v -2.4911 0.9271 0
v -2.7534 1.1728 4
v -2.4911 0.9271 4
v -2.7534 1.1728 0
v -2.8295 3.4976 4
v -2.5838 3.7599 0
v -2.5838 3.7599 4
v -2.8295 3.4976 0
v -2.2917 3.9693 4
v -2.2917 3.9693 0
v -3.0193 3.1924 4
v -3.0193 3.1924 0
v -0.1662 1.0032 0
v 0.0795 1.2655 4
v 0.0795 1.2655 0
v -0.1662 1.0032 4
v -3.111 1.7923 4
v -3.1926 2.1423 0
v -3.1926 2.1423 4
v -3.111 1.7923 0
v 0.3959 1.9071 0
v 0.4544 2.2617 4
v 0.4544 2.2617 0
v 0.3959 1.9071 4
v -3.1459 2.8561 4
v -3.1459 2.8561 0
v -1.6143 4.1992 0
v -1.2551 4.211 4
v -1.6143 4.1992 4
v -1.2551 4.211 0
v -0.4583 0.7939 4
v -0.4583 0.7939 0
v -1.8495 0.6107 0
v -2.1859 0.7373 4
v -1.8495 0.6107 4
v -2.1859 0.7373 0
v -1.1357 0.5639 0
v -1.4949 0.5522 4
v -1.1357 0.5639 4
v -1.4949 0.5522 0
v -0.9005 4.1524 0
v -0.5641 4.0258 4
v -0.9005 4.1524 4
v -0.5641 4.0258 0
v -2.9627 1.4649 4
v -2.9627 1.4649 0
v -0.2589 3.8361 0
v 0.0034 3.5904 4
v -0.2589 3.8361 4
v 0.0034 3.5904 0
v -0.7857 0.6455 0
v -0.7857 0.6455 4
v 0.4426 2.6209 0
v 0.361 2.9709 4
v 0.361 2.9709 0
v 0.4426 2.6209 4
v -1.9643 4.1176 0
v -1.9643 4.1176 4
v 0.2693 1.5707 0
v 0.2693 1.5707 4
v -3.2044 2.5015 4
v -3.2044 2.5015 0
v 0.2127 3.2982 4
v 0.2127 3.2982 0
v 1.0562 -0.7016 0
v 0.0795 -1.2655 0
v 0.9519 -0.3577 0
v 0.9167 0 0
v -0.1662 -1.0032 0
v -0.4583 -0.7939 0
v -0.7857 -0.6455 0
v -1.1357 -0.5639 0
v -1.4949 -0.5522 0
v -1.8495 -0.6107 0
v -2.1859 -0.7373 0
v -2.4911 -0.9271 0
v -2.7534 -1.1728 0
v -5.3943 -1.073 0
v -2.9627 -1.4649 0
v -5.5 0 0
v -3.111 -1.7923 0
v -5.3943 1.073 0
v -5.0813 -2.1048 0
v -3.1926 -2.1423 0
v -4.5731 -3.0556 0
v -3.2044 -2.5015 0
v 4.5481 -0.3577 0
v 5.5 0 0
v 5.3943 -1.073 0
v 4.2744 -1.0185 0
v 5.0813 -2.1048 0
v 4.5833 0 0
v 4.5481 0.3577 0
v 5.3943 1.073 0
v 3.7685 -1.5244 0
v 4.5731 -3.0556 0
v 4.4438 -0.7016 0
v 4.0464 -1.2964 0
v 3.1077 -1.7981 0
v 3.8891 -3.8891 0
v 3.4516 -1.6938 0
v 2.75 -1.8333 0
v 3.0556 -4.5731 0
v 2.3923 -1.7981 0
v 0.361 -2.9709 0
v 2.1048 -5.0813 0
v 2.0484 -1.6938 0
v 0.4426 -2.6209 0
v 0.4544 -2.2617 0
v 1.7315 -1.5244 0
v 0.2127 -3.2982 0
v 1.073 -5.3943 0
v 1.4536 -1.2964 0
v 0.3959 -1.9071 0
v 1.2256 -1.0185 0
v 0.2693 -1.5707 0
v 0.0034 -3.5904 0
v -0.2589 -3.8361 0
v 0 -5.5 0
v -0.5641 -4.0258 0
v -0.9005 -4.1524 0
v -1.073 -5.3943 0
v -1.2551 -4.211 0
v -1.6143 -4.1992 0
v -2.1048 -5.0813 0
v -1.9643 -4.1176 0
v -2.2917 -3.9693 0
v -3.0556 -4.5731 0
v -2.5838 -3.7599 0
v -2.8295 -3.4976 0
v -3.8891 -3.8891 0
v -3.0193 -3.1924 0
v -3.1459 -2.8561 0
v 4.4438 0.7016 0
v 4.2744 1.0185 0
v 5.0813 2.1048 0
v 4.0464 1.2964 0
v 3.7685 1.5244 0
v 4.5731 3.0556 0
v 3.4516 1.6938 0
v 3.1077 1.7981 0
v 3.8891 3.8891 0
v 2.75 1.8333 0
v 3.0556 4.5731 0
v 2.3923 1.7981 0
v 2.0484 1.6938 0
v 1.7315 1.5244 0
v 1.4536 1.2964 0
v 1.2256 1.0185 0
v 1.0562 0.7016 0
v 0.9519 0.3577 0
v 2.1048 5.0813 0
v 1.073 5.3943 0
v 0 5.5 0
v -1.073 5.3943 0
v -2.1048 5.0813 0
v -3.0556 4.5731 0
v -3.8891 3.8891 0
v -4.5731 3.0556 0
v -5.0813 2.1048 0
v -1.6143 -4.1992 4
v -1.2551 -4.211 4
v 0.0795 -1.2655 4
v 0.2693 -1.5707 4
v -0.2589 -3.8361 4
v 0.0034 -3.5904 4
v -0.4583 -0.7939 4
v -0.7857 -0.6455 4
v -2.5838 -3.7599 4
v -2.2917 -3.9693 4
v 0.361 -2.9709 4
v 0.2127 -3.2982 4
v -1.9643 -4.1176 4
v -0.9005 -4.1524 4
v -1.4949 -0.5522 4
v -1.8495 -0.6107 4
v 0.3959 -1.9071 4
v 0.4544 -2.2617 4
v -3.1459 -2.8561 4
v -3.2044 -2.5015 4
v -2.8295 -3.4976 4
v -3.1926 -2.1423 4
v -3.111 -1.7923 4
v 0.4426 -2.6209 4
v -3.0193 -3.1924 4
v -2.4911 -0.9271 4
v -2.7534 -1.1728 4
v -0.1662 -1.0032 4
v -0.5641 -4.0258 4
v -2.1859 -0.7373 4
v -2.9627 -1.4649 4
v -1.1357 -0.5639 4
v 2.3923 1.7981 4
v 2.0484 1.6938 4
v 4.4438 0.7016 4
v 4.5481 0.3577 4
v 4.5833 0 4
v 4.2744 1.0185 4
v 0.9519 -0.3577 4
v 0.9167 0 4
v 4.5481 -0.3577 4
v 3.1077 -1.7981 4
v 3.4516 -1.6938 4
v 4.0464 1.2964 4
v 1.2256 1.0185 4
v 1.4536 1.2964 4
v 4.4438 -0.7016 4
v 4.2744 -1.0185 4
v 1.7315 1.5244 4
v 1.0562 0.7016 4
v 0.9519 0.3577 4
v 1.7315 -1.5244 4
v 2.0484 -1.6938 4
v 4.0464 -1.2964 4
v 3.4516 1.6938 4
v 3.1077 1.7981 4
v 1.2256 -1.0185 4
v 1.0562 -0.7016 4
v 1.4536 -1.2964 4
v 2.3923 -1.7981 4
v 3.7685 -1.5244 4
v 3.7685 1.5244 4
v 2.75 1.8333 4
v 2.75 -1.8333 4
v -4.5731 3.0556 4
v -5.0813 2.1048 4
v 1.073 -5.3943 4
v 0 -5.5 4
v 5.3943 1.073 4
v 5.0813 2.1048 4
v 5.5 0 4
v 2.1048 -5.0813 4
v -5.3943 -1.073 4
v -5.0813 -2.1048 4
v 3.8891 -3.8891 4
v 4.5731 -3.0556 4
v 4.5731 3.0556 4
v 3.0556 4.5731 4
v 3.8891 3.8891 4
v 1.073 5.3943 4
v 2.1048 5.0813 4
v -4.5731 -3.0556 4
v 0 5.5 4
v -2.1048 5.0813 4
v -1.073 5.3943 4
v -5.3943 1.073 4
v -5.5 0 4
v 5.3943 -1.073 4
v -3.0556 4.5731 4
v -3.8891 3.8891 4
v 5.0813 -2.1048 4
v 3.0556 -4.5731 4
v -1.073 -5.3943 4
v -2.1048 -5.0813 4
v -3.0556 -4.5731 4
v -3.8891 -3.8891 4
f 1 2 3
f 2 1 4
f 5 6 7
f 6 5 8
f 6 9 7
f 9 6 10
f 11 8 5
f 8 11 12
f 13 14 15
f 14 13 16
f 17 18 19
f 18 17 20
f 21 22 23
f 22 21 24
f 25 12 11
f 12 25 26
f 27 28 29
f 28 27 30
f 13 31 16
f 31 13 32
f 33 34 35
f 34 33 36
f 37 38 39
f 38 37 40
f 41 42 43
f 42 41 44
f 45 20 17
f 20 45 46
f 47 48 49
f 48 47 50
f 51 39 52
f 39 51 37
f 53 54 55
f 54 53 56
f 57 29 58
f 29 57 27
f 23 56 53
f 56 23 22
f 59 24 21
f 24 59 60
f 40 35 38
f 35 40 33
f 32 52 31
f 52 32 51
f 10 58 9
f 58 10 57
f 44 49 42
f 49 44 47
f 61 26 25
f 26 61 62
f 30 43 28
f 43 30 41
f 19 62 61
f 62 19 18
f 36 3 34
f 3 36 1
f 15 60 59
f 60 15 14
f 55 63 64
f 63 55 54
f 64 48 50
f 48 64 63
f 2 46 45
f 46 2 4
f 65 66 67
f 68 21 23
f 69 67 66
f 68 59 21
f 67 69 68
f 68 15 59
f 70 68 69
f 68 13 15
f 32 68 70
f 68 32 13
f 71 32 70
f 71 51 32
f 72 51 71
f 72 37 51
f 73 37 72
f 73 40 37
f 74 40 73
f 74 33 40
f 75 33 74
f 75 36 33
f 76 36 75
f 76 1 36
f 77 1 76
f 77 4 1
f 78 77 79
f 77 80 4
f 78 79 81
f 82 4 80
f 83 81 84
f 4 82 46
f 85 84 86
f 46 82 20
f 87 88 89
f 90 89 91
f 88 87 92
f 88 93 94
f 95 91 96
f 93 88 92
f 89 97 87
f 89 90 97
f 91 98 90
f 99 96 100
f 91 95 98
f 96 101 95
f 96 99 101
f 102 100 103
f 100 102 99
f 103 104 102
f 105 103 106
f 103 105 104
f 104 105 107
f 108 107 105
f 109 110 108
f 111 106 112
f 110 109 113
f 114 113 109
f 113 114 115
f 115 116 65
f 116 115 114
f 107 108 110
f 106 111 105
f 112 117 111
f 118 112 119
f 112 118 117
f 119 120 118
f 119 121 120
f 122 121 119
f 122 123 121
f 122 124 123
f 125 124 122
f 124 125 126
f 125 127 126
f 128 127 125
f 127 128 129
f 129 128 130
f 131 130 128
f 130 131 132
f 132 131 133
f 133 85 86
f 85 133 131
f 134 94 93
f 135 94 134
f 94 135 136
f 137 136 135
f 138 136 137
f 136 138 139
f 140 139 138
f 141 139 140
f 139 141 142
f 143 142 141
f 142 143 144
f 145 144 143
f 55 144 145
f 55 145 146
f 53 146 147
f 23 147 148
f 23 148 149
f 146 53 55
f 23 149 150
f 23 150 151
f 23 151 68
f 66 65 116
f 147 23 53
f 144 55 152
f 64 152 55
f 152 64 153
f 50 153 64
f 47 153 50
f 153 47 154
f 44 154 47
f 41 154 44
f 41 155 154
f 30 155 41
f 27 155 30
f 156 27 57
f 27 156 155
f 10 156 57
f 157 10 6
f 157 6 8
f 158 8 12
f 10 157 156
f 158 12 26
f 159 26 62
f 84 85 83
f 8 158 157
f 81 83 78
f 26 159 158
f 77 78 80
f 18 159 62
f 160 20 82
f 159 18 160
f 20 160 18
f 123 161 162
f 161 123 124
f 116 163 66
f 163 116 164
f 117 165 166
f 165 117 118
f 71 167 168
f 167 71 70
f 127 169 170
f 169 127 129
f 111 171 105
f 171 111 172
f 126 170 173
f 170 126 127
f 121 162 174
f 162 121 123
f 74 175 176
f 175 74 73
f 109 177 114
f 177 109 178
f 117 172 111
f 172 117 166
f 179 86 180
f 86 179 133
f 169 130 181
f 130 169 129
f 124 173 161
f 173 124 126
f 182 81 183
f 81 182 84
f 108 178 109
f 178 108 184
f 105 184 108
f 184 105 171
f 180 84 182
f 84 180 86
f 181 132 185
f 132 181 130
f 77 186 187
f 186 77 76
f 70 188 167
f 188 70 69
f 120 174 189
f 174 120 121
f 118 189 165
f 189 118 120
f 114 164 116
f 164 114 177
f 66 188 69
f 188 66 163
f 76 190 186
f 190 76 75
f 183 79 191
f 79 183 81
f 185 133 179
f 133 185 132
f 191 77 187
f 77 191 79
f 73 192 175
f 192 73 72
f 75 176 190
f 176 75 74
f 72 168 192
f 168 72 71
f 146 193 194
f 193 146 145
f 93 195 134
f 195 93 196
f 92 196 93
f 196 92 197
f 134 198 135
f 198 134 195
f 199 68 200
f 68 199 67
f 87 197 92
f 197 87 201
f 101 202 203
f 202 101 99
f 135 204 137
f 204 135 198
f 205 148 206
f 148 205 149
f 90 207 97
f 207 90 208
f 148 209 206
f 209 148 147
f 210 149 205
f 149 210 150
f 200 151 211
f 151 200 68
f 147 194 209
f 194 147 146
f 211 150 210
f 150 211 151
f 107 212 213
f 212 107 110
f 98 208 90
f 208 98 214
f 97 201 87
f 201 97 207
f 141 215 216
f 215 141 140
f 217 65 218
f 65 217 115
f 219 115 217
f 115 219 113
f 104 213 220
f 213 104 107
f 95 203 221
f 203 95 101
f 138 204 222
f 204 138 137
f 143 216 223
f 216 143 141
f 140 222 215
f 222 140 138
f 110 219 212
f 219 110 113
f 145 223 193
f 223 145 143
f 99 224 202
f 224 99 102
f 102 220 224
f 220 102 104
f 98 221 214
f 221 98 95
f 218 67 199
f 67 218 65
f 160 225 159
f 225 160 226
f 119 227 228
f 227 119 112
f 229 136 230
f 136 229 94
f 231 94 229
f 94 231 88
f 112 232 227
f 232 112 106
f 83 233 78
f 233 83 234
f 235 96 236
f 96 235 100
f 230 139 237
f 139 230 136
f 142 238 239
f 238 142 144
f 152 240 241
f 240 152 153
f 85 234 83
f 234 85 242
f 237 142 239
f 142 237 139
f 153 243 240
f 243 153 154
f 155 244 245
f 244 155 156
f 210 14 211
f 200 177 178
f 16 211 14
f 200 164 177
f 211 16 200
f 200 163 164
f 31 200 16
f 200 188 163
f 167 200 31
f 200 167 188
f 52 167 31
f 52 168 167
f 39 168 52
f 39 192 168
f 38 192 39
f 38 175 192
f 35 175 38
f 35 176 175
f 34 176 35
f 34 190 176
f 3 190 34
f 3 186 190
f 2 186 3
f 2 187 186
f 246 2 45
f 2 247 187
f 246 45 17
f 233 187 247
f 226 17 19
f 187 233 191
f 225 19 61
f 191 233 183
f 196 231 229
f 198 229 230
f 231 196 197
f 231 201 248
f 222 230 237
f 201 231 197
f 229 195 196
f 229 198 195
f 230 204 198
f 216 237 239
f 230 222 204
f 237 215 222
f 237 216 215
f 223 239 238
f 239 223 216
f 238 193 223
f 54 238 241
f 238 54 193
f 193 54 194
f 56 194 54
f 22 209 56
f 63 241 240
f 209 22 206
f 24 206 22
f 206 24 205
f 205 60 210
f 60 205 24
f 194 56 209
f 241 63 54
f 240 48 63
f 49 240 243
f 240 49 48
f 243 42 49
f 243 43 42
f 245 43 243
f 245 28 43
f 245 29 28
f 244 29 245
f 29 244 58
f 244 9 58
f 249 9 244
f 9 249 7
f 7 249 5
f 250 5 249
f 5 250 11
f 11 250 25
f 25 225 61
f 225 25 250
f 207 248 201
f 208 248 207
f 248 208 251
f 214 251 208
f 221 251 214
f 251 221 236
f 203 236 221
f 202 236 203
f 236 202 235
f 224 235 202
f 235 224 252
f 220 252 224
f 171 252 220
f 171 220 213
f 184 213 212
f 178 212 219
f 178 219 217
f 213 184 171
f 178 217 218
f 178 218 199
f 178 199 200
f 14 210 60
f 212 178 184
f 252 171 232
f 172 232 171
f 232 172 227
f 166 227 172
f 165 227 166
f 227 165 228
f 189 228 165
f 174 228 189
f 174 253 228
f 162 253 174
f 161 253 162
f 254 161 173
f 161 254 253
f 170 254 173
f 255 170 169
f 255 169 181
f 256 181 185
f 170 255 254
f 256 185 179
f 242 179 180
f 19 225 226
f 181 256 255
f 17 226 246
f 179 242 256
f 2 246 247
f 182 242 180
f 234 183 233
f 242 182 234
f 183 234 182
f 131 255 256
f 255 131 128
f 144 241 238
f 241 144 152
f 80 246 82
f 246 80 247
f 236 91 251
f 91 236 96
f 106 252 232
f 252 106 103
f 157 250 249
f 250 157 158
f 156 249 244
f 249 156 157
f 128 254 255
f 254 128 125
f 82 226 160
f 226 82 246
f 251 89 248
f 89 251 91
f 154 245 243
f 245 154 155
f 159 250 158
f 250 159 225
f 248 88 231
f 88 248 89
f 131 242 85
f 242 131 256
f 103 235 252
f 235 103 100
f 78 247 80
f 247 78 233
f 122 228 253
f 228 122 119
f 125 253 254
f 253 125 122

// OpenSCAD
/* [Straw Config] */

// Outer diameter of the straw being placed on, in mm.
straw_outer_diameter = 11.6;

// Thickness of the straw's material, in mm.
straw_thickness = 0.3;

/* [Dimensions] */

// Thickness of the part, in mm.
thickness = 4;

/* [Expert] */

// Quality
$fn=32;

difference() {
    cylinder(h = thickness, d = straw_outer_diameter - 2*straw_thickness);

    for(i = [1:3])
        rotate([0, 0, i*360/3])
            translate([(straw_outer_diameter - 2*straw_thickness)/4, 0, 0])
                cylinder(h = thickness+2, d = (straw_outer_diameter - 2*straw_thickness)/3);
}
